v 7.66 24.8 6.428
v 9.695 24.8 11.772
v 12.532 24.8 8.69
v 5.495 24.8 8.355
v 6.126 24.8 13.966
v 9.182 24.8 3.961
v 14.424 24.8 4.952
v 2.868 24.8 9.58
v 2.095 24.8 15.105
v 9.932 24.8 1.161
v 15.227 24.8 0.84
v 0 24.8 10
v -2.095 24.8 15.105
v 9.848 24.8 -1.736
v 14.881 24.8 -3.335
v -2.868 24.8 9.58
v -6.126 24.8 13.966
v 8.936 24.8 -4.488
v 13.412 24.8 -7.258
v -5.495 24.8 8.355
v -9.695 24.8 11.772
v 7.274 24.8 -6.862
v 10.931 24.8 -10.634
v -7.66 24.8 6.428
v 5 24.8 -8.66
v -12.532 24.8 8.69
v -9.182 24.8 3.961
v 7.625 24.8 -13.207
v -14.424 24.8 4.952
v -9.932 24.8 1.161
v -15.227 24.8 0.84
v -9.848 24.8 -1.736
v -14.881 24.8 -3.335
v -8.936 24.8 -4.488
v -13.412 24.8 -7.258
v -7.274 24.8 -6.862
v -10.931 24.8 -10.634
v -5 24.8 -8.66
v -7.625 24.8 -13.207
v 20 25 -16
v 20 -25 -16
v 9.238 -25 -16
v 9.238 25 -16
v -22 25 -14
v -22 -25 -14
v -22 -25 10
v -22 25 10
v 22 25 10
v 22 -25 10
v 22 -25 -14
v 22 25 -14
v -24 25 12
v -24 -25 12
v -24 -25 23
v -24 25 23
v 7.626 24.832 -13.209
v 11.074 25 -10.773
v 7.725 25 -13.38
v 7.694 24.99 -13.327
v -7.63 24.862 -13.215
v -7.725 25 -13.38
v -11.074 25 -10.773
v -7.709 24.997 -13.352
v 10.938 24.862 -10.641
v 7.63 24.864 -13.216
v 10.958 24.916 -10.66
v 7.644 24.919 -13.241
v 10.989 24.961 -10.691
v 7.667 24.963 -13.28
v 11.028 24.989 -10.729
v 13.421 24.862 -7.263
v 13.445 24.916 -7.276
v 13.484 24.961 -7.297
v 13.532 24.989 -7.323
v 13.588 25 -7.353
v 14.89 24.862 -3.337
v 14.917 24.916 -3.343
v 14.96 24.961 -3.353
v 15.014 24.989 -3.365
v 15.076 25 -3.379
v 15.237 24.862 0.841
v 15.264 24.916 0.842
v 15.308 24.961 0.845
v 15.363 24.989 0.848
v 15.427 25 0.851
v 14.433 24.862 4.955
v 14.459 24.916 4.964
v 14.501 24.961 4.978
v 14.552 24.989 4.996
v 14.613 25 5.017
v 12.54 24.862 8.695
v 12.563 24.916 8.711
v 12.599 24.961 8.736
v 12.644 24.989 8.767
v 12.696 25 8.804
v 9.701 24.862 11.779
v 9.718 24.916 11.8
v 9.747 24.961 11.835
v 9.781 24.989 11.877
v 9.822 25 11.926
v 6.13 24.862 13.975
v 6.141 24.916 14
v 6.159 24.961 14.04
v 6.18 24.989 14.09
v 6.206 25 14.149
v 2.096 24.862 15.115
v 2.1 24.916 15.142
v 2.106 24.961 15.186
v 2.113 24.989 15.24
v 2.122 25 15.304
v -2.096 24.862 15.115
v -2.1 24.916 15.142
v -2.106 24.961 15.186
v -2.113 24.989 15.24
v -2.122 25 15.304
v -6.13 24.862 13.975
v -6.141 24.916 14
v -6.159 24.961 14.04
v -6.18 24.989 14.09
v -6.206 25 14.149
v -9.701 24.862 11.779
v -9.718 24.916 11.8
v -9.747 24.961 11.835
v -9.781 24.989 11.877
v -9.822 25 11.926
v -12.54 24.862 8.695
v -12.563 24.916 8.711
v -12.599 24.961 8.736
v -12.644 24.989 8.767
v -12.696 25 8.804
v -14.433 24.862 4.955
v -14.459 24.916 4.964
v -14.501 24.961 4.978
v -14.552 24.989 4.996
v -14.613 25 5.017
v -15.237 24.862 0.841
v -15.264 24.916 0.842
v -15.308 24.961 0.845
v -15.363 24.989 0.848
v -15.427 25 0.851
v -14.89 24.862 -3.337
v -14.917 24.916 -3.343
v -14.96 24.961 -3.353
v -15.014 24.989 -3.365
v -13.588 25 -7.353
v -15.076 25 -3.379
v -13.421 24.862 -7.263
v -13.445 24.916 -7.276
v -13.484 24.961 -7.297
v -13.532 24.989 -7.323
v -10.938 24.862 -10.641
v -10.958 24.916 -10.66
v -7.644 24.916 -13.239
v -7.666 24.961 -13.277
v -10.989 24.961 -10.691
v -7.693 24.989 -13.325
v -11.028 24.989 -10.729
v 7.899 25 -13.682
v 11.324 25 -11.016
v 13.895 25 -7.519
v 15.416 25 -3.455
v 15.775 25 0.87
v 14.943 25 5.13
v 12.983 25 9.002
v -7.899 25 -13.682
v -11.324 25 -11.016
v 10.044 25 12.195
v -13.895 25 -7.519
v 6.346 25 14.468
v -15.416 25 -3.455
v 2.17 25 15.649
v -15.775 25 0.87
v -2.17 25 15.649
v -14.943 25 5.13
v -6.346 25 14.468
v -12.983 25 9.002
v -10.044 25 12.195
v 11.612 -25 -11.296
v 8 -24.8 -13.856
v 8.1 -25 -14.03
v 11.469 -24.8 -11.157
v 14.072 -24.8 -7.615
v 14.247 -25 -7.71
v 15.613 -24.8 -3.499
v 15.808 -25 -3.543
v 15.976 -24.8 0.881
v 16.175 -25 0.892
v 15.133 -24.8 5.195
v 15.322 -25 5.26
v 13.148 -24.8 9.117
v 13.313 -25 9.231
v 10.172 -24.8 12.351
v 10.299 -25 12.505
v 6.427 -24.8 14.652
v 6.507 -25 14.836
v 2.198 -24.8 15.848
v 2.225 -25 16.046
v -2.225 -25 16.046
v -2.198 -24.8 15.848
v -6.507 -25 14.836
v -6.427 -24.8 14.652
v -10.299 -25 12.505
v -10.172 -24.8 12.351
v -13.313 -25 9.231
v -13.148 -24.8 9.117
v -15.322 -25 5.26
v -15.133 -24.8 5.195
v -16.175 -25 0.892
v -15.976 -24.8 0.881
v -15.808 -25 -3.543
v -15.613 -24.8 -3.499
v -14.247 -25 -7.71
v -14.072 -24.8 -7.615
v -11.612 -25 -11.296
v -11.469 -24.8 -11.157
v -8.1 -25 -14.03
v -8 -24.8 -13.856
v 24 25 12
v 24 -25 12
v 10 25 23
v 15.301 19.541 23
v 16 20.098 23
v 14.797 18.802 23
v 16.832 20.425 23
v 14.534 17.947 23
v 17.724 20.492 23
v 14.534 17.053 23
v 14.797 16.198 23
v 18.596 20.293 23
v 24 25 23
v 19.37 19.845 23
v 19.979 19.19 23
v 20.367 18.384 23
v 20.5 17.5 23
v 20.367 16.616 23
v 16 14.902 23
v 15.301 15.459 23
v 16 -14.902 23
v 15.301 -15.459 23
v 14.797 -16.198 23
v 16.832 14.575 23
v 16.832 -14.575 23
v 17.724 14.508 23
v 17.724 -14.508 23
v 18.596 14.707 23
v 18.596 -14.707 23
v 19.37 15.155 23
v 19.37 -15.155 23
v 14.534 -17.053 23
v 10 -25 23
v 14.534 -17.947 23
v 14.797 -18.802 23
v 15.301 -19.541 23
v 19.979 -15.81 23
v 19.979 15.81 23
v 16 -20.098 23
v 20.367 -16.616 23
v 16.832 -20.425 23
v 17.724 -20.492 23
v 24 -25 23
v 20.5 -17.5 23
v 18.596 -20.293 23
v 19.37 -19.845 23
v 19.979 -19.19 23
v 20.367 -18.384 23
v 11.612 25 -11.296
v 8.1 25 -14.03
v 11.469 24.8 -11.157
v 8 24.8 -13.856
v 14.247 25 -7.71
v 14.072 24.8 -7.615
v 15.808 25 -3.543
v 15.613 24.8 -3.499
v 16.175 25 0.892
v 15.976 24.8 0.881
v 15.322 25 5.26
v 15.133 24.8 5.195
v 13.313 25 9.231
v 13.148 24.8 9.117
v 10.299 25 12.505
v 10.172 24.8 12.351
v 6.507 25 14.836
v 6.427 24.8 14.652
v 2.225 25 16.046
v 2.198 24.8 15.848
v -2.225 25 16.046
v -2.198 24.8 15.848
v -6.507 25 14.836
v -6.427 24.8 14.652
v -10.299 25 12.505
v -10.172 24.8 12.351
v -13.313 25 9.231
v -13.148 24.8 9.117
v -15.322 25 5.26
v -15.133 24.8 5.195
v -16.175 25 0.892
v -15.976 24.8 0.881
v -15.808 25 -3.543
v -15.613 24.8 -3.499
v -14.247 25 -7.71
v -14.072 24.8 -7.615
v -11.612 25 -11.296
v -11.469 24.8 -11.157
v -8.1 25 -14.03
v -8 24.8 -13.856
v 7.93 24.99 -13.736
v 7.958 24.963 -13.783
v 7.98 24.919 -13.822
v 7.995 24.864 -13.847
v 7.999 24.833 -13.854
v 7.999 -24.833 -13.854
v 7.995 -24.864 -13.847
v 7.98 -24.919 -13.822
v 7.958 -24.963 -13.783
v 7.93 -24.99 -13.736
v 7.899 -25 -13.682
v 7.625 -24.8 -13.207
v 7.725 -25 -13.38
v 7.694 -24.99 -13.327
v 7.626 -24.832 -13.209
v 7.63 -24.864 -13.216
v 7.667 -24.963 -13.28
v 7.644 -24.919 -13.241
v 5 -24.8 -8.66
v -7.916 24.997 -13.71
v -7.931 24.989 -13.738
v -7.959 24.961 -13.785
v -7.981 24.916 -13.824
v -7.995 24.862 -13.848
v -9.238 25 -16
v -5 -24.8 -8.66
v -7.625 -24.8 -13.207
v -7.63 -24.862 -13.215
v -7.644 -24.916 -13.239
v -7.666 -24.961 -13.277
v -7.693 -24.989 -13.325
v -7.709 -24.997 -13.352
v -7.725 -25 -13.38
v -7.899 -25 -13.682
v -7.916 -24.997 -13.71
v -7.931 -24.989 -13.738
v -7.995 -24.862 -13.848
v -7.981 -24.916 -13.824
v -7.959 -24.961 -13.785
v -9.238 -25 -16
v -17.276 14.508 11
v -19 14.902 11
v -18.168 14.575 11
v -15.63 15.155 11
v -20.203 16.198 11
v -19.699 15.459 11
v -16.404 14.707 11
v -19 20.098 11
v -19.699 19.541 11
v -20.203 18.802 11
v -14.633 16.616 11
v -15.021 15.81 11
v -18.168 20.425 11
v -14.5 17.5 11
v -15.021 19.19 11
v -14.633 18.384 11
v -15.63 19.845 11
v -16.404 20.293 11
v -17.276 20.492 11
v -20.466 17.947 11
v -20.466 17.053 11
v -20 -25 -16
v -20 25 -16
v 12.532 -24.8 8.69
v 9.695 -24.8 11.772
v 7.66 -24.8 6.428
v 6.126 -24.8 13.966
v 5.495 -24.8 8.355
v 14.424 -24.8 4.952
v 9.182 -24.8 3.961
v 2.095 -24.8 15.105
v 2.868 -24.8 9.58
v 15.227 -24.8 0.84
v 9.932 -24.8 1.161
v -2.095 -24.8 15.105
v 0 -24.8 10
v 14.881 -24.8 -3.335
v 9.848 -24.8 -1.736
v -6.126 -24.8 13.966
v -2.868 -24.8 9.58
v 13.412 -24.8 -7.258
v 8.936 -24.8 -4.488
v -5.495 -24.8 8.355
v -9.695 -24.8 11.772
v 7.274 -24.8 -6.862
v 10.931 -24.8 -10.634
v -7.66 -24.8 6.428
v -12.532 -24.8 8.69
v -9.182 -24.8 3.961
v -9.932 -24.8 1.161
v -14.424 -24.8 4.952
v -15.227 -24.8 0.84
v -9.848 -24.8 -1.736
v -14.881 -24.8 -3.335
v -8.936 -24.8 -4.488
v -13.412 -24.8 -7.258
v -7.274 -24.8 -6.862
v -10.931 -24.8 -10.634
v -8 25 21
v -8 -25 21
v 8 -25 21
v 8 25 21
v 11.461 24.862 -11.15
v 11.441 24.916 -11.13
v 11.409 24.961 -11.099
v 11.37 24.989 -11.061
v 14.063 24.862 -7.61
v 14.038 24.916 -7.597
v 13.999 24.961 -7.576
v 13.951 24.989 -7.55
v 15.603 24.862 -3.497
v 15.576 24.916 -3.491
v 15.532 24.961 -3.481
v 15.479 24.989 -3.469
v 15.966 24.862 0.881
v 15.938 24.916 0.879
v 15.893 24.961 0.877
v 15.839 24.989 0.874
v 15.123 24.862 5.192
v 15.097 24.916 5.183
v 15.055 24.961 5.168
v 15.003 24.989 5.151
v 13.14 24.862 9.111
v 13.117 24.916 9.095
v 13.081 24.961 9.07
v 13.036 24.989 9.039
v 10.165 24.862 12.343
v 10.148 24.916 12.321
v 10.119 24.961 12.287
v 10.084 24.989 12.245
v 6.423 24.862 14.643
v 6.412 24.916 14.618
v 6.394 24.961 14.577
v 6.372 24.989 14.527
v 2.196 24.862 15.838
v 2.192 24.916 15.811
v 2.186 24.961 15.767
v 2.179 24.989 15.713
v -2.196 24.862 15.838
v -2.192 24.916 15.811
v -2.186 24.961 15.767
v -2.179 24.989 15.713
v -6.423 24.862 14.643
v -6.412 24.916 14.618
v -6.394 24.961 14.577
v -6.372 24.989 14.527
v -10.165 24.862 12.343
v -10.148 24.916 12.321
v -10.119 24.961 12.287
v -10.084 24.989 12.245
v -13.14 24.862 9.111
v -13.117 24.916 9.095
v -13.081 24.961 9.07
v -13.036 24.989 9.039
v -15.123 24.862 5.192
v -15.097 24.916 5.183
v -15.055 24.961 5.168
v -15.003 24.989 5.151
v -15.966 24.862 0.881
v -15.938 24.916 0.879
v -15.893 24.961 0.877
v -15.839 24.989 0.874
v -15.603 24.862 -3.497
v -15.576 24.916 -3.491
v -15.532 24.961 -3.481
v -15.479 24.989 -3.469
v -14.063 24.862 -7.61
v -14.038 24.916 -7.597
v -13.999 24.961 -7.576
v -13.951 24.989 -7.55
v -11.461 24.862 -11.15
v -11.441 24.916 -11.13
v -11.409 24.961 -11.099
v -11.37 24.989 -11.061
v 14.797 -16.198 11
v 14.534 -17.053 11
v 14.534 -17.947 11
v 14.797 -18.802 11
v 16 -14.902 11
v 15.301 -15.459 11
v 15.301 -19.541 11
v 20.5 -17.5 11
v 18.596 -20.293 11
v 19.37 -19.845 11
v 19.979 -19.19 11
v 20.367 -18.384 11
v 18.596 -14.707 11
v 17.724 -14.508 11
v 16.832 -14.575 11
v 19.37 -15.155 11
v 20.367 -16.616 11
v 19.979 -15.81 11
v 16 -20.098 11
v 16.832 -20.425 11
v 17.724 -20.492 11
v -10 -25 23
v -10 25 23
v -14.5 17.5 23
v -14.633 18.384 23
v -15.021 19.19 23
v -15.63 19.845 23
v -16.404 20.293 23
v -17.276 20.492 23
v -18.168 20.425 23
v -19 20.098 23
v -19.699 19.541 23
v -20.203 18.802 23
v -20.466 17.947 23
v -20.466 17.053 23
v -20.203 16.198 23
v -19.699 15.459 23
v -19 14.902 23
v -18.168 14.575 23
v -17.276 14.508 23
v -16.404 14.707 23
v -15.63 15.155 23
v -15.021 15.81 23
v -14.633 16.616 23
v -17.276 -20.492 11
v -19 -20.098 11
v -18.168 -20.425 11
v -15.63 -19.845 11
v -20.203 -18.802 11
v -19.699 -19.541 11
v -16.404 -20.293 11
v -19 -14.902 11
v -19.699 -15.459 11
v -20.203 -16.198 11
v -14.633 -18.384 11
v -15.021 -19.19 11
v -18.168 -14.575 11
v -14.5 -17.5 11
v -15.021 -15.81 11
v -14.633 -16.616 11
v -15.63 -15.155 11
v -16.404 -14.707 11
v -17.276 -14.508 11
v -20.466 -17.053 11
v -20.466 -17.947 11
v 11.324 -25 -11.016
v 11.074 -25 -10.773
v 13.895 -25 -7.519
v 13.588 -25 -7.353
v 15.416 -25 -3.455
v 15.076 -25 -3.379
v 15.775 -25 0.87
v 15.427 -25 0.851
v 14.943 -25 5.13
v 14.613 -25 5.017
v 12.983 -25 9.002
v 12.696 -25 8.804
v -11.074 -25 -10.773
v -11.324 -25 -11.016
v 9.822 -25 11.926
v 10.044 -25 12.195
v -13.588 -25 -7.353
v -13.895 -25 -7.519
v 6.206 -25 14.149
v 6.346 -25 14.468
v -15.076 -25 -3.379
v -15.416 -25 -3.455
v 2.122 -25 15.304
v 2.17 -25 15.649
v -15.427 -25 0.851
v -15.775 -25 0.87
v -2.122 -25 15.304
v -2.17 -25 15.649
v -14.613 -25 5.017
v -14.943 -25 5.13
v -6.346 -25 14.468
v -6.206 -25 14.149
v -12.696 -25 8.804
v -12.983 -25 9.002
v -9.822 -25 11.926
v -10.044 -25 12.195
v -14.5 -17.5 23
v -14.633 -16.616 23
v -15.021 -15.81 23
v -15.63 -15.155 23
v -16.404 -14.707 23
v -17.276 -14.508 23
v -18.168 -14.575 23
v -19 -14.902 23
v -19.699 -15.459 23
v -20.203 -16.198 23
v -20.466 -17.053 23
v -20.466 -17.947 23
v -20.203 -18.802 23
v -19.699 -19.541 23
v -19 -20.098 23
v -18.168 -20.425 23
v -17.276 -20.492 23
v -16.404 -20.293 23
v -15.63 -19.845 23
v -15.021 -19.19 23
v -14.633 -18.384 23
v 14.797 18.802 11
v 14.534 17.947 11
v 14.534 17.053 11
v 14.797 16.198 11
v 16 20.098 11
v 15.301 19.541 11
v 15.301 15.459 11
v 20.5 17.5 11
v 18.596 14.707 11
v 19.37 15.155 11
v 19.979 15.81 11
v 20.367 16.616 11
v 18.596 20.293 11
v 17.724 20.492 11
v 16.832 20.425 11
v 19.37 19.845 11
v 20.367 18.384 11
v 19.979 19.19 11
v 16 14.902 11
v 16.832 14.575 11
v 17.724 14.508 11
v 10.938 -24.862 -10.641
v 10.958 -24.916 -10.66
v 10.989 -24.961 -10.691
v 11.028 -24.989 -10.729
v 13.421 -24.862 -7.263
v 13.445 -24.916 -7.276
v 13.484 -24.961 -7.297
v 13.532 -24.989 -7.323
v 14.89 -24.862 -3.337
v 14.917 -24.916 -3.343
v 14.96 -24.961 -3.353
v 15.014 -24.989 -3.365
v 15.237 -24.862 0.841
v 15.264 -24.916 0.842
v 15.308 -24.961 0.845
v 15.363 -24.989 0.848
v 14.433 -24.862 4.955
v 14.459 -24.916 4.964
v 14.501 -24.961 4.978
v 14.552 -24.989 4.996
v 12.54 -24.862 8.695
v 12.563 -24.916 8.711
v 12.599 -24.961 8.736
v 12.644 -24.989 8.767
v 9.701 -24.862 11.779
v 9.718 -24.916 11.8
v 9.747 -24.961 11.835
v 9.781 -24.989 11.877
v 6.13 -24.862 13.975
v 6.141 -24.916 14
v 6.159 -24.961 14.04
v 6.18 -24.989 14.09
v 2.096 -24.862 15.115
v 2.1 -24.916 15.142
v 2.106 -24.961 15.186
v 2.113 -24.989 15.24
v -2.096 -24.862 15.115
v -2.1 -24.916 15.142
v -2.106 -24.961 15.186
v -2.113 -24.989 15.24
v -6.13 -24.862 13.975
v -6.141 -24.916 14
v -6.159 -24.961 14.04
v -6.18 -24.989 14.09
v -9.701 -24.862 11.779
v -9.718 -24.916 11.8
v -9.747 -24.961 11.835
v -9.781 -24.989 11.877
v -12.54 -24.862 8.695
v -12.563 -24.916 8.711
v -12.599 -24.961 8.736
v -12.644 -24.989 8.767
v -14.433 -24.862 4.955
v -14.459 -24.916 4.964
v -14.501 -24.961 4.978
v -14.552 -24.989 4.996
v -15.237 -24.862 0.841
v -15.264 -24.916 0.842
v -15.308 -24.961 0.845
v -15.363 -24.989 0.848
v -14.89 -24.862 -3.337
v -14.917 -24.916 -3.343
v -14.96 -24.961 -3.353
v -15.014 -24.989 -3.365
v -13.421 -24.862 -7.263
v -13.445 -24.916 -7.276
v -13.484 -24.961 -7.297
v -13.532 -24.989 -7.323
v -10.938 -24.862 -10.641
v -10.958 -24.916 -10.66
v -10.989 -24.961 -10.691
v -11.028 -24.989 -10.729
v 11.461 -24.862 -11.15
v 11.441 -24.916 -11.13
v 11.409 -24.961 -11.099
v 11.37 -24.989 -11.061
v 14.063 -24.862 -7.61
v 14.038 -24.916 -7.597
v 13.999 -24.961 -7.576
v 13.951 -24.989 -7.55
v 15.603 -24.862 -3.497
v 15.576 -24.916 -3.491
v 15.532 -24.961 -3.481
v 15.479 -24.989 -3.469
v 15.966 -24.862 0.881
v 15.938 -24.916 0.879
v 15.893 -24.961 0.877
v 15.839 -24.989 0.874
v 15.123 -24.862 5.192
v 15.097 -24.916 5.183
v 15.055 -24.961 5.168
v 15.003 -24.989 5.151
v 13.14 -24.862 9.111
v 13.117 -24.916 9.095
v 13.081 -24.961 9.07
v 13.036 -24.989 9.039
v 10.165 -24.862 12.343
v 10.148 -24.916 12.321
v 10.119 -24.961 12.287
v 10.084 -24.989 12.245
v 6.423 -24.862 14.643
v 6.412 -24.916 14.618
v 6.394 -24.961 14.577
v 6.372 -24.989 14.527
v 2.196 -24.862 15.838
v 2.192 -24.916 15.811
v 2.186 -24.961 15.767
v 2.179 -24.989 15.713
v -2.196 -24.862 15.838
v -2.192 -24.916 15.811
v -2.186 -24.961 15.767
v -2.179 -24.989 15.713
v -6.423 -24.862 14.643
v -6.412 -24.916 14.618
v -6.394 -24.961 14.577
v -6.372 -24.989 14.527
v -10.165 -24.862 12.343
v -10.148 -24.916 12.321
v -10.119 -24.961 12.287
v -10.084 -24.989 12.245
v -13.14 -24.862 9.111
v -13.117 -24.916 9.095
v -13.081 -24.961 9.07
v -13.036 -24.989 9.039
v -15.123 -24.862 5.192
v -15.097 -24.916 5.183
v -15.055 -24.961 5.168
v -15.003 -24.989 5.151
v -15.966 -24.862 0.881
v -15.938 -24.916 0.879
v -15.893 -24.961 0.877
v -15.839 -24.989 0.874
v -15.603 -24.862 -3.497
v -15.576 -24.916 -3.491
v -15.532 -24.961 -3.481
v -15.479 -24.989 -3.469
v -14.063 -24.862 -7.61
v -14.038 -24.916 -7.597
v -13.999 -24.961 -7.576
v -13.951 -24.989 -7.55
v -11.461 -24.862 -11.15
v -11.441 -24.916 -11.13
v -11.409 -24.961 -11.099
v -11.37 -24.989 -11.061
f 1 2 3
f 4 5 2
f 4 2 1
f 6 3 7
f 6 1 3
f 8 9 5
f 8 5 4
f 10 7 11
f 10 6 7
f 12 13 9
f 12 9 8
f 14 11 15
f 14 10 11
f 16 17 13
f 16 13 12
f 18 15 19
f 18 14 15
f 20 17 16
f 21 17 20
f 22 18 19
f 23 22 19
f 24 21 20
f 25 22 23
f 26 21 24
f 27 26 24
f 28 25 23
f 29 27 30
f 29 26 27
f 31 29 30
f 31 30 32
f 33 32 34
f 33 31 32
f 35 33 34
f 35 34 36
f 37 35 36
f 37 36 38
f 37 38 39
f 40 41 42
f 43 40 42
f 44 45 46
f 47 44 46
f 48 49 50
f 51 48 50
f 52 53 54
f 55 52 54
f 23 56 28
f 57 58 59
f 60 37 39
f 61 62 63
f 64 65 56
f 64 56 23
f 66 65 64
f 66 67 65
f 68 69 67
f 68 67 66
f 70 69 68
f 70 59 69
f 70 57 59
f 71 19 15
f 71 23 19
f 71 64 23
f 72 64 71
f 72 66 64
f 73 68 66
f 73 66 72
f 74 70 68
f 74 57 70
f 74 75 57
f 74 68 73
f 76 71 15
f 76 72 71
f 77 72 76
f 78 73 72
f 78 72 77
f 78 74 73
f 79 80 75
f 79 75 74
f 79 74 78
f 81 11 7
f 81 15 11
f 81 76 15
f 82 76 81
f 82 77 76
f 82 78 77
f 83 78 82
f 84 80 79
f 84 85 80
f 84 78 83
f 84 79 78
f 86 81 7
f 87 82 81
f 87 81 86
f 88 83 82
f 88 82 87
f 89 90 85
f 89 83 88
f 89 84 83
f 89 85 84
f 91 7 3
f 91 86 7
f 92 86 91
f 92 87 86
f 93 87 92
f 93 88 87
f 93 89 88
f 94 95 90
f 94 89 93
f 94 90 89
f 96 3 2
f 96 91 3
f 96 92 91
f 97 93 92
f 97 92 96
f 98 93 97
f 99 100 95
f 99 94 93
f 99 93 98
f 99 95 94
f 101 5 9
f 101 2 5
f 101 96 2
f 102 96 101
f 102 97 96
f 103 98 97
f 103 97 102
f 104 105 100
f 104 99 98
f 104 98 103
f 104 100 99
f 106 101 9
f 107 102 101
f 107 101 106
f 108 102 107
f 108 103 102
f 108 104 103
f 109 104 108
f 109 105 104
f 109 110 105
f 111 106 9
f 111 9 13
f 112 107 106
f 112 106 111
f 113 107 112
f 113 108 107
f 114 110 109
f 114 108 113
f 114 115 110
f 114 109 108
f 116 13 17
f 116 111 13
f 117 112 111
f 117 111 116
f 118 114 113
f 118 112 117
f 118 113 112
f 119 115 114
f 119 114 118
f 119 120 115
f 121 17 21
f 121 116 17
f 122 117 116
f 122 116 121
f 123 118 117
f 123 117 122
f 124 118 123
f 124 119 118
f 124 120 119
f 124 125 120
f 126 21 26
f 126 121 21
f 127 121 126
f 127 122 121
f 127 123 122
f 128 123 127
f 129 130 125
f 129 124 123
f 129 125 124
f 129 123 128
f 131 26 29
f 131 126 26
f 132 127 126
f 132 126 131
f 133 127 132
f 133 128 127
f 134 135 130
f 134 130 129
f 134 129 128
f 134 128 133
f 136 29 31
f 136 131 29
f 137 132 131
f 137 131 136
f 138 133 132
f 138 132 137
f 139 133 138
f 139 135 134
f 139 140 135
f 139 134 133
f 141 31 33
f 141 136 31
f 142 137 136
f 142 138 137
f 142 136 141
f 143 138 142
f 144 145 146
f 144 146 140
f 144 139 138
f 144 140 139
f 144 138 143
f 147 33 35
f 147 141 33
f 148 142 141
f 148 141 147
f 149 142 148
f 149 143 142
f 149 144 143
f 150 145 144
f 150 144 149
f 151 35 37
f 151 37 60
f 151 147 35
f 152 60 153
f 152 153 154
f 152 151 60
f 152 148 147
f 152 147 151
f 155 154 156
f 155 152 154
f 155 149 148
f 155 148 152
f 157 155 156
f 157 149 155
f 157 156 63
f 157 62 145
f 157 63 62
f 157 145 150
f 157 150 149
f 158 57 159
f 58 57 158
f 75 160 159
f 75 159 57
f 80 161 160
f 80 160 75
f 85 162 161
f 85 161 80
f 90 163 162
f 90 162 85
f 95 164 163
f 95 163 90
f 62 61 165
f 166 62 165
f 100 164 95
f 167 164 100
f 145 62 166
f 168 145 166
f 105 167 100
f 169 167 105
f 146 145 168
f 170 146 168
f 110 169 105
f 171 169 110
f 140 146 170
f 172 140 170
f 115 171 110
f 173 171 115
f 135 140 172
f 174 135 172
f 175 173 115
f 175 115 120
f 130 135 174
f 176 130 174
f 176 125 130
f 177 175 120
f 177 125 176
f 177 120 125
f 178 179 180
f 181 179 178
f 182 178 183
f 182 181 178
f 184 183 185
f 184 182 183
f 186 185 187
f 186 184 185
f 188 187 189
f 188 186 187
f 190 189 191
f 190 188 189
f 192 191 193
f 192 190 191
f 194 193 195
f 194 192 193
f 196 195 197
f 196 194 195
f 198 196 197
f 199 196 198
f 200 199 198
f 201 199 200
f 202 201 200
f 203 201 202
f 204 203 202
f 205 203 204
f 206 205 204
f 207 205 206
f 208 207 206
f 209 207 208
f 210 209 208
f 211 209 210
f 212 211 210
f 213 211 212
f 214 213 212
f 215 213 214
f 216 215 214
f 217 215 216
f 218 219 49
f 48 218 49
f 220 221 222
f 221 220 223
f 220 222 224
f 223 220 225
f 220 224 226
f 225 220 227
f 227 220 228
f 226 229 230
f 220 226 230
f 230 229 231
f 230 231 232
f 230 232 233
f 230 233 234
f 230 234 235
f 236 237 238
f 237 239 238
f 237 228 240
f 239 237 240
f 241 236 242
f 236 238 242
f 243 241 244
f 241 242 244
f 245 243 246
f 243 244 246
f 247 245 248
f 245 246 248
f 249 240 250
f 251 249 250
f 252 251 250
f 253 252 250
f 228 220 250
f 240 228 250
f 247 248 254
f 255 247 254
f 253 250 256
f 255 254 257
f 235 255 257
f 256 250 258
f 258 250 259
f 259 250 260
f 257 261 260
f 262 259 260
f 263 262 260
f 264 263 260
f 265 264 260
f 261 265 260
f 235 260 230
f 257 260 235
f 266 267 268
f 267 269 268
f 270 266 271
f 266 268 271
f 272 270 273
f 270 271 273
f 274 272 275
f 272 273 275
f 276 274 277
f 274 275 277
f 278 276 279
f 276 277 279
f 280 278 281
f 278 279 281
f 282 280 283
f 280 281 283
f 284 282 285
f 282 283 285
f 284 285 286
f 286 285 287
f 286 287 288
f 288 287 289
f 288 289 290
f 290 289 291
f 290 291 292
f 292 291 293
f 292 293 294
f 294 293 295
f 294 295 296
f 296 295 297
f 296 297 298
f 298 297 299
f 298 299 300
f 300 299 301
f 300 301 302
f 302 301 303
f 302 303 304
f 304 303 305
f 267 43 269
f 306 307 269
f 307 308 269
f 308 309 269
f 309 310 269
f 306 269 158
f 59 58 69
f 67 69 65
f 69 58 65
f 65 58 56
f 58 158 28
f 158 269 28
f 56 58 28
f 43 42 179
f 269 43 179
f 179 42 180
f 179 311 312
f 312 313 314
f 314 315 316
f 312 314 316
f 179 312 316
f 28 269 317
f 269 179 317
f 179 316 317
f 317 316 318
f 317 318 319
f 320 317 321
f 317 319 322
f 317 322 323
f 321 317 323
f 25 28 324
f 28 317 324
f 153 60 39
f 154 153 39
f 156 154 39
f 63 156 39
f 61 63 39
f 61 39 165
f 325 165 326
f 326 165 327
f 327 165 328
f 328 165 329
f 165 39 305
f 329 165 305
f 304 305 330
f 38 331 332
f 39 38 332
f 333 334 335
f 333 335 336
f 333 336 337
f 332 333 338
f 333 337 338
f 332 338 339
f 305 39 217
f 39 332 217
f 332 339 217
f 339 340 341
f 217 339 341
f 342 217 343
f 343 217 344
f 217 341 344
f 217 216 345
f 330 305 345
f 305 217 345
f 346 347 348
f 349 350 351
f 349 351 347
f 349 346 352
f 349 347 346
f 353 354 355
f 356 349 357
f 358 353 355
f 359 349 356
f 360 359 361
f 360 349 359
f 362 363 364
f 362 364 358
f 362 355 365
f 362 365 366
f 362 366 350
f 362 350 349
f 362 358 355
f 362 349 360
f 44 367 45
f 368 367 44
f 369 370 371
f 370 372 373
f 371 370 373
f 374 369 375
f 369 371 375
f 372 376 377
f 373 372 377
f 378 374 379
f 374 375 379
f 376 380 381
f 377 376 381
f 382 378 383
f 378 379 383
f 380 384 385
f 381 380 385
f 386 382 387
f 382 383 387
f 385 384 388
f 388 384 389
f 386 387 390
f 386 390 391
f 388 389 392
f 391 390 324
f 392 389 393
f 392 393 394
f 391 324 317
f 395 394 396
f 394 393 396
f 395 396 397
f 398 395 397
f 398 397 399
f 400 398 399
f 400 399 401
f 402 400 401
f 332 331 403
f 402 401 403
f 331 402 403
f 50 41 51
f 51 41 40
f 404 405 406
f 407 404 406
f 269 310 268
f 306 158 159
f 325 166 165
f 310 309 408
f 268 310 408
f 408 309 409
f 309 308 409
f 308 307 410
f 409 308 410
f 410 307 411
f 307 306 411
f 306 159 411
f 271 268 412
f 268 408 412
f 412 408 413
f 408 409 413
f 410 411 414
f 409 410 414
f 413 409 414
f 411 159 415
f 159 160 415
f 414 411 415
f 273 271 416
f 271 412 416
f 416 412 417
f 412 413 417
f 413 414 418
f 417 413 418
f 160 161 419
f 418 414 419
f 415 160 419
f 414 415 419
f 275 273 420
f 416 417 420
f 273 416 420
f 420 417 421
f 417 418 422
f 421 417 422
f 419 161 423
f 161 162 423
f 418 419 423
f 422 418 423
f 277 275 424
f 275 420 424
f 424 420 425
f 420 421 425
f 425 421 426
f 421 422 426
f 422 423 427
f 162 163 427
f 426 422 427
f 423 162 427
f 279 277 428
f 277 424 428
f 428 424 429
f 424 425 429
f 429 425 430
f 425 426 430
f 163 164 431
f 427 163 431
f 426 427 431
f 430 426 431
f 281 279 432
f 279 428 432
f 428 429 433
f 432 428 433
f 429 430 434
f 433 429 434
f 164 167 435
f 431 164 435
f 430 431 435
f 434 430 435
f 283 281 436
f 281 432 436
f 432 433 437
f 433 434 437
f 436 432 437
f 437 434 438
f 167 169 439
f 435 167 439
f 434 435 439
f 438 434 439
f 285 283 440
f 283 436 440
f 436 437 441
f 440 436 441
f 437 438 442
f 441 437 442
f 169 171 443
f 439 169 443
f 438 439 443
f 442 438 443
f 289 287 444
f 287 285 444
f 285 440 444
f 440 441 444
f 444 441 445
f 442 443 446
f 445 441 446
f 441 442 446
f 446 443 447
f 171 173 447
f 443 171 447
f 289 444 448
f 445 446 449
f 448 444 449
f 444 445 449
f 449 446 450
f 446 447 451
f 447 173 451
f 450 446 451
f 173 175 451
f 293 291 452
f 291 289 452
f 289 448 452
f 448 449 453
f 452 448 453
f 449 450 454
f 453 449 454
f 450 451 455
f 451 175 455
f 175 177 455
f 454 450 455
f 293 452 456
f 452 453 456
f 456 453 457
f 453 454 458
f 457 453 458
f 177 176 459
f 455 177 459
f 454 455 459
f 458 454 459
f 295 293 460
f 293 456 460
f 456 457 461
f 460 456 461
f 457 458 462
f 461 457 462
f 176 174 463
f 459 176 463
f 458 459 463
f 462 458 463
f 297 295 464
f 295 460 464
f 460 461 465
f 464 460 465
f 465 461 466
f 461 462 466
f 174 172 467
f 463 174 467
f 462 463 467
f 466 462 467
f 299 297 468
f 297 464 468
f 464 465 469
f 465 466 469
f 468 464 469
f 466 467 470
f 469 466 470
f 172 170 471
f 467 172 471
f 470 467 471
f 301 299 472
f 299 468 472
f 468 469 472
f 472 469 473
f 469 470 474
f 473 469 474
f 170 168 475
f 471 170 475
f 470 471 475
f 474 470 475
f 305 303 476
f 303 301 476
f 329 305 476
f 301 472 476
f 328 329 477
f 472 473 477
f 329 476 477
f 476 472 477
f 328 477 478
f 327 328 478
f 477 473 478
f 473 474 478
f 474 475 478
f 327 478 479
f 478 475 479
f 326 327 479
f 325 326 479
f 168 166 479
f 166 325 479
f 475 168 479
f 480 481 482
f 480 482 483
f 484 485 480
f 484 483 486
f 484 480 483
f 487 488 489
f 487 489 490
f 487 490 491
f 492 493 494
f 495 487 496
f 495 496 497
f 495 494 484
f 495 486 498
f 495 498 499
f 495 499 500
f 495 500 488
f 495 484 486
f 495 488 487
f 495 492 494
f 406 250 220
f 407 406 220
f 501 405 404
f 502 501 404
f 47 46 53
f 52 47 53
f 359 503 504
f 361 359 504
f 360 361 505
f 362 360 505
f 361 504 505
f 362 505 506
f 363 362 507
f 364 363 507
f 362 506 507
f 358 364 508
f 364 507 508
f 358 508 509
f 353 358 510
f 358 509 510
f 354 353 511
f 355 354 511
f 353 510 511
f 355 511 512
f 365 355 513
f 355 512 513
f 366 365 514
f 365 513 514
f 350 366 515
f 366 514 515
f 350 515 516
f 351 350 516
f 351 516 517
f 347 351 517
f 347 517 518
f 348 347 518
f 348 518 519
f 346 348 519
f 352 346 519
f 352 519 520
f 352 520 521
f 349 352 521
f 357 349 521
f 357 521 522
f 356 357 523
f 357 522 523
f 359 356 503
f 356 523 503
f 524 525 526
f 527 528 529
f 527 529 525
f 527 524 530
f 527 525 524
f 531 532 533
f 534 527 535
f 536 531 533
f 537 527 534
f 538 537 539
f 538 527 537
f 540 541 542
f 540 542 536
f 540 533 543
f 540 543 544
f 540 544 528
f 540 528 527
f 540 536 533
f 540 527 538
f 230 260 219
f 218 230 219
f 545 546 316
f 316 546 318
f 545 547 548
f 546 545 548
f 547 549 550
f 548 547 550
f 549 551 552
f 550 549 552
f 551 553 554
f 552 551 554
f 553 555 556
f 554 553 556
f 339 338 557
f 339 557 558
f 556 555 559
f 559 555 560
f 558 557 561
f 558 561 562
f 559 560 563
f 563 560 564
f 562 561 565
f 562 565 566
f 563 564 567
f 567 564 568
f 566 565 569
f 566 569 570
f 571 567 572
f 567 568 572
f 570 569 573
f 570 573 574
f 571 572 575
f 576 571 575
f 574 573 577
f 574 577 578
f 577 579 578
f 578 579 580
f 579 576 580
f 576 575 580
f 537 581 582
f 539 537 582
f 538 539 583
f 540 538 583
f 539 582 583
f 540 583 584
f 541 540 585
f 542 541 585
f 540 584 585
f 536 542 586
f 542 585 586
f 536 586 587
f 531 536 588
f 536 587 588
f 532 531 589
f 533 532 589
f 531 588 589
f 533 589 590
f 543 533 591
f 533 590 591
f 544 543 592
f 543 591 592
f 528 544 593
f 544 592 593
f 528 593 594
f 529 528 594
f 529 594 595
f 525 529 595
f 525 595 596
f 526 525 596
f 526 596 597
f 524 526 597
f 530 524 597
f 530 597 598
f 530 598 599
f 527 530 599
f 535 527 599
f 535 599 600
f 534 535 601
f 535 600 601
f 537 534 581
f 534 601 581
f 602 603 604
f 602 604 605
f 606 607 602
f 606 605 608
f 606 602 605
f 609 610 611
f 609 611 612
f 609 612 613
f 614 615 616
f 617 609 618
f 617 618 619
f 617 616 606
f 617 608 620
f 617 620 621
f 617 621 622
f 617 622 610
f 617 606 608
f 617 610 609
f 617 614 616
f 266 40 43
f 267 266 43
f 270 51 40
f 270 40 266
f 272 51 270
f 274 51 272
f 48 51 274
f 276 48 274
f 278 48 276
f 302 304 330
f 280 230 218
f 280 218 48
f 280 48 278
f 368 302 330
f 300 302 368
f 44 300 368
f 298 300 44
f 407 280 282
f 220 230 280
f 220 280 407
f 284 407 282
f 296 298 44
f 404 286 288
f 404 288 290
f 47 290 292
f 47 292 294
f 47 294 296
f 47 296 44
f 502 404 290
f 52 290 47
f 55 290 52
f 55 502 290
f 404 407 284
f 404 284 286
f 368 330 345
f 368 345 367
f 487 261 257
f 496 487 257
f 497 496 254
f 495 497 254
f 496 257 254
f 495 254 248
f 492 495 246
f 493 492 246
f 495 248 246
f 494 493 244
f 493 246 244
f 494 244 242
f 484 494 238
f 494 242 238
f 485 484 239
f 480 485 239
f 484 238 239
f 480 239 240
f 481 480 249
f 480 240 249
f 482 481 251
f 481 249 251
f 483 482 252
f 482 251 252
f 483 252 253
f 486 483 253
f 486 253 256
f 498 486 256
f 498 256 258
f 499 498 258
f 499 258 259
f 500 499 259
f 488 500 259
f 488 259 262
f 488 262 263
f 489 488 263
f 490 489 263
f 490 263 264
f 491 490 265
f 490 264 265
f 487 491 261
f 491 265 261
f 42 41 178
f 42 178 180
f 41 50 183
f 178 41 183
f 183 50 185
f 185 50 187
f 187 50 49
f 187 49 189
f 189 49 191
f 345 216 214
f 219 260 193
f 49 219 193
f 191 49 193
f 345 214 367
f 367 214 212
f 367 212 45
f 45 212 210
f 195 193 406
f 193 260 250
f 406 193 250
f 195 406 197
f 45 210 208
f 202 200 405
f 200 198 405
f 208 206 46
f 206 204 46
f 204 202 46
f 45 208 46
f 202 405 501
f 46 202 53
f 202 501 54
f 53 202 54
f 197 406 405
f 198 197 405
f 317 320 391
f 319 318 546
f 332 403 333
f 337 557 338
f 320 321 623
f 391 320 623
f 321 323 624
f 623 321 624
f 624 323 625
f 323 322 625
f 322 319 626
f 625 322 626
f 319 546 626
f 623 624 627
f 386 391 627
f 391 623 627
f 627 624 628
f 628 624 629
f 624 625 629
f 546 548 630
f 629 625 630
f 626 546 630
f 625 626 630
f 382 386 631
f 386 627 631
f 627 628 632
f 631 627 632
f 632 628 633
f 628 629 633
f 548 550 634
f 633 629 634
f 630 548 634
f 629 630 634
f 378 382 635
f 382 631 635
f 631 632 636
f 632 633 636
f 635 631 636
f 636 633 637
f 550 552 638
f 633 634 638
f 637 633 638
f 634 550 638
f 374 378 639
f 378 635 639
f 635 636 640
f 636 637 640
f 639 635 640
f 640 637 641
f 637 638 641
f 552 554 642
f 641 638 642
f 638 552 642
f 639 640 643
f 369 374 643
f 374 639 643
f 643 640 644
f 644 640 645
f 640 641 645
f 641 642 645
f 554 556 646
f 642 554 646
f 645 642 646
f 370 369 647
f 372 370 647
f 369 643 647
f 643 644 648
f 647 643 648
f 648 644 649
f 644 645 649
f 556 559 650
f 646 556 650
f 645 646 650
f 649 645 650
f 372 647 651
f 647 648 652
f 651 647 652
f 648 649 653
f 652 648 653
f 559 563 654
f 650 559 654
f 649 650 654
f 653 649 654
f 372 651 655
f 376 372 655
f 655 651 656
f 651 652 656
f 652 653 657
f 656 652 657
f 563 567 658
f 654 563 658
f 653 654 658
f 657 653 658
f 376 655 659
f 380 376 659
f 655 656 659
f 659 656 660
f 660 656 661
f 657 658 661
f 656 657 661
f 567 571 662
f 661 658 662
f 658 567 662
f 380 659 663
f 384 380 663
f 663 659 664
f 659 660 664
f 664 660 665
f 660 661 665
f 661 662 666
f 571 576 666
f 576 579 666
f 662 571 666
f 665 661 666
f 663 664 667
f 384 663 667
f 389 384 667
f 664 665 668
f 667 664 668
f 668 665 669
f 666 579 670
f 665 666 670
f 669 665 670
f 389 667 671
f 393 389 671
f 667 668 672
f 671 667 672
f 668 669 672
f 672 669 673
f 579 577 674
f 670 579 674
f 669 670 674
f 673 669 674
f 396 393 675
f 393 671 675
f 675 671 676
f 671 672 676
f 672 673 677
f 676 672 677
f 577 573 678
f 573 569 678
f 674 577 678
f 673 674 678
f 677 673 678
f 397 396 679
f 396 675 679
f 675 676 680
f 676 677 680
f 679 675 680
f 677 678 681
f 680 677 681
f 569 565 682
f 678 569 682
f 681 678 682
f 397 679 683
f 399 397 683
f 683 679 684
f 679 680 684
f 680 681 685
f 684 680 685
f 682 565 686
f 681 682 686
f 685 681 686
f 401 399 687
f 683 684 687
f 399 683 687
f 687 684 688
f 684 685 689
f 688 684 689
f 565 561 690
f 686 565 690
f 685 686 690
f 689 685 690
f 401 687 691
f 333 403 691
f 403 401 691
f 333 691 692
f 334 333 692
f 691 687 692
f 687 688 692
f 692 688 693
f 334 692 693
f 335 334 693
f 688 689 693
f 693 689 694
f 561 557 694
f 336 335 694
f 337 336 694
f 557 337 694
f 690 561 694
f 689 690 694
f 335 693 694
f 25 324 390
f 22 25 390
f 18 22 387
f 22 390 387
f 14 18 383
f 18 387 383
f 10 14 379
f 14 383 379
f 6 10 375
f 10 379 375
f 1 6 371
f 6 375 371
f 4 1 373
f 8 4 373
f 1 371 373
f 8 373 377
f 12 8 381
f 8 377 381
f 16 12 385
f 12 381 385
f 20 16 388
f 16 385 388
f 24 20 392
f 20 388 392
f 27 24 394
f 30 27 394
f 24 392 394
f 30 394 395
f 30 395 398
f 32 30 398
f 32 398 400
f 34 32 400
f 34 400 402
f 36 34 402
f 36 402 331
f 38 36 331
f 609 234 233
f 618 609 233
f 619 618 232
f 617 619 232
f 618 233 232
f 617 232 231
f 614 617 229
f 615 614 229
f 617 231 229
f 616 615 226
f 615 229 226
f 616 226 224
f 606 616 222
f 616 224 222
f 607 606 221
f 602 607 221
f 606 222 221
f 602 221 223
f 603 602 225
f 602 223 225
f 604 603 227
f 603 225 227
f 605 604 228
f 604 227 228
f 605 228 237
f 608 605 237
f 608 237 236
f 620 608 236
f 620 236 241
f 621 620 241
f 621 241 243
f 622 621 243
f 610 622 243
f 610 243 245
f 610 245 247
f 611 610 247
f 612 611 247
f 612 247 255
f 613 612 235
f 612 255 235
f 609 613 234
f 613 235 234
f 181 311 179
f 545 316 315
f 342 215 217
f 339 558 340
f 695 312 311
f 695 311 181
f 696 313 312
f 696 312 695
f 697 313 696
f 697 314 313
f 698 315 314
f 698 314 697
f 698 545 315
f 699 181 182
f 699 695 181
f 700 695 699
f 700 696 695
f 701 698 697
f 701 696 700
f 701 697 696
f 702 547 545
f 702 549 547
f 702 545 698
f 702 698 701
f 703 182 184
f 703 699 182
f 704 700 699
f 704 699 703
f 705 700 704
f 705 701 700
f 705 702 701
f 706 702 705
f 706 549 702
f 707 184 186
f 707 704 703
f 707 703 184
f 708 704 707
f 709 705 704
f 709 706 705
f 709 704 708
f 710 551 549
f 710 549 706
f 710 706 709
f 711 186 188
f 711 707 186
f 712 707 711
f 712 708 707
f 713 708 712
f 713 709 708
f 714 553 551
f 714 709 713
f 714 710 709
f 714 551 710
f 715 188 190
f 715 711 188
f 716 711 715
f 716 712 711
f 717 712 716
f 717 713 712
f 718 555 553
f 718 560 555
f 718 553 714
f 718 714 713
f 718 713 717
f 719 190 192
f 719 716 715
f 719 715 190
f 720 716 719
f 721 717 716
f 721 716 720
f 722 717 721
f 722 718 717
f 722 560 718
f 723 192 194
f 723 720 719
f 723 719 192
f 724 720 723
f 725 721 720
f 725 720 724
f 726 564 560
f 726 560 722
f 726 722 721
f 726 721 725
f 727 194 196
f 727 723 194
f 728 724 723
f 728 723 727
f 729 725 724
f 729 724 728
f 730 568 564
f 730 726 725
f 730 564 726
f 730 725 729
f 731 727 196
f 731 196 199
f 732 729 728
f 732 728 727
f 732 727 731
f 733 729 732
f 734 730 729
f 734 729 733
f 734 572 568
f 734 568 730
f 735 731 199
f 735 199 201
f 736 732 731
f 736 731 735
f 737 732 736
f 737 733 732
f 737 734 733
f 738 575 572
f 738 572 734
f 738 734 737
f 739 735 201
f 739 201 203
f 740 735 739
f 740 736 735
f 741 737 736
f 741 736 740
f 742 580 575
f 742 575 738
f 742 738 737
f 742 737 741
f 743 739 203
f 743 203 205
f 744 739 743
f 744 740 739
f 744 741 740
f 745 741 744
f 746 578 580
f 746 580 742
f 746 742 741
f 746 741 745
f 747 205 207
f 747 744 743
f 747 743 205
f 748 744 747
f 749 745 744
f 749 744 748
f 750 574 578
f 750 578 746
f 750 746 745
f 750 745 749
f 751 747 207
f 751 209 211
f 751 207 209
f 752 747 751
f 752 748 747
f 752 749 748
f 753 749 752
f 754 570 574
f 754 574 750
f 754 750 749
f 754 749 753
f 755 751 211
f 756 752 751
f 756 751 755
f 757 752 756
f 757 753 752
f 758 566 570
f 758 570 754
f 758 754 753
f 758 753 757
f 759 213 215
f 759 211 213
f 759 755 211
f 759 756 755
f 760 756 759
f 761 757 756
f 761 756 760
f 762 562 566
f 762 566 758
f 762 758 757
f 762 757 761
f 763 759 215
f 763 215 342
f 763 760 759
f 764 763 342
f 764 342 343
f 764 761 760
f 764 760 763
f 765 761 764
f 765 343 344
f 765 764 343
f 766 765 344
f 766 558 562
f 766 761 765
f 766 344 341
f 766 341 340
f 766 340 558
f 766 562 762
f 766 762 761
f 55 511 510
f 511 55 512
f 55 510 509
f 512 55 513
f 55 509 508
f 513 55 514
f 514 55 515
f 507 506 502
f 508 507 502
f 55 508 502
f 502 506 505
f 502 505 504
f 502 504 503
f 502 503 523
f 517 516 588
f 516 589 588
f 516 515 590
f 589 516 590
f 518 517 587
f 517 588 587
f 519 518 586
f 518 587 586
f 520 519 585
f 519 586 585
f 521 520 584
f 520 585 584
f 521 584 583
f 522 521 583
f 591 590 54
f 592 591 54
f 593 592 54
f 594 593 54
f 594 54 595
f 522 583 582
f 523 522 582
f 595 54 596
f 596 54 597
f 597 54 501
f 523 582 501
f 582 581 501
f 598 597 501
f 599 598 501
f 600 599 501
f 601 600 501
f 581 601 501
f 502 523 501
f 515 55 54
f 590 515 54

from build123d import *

# Parameters (mm, degrees)
EXTRUDE_2_DEPTH     = 50
CHAMFER_1_SIZE      = 2
SKETCH_5_R          = 3
CUT_EXTRUDE_1_DEPTH = 12
CHAMFER_2_SIZE      = 2


with BuildPart() as part:
    # 草图4 → 拉伸2 (new body)
    with BuildSketch(Plane(origin=(0, -25, 0), x_dir=(-1, 0, 0), z_dir=(0, 1, 0))):
        with BuildLine():
            Line((8, 21), (-8, 21))
            Line((-8, 21), (-8, 23))
            Line((-8, 23), (-24, 23))
            Line((-24, 23), (-24, 12))
            Line((-24, 12), (-22, 10))
            Line((-22, 10), (-22, -16))
            Line((-22, -16), (-9.237604307, -16))
            Line((-9.237604307, -16), (-5, -8.660254038))
            ThreePointArc((-5, -8.660254038), (0, 10), (5, -8.660254038))
            Line((5, -8.660254038), (9.237604307, -16))
            Line((9.237604307, -16), (22, -16))
            Line((22, -16), (22, 10))
            Line((22, 10), (24, 12))
            Line((24, 12), (24, 23))
            Line((24, 23), (8, 23))
            Line((8, 23), (8, 21))
        make_face()
    extrude(amount=EXTRUDE_2_DEPTH)

    # 倒角1
    chamfer_1_edges = [part.edges().sort_by_distance(p)[0] for p in [
        (-8, 0, 23),
        (8, 0, 23),
    ]]
    chamfer(chamfer_1_edges, length=CHAMFER_1_SIZE - 0.0001)  # a hair under: the kernel refuses the full size

    # 草图5 → 切除-拉伸1 (cut)
    with BuildSketch(Plane.XY.offset(23)):
        with Locations((-17.5, 17.5)):
            Circle(SKETCH_5_R)
        with Locations((17.5, 17.5)):
            Circle(SKETCH_5_R)
        with Locations((17.5, -17.5)):
            Circle(SKETCH_5_R)
        with Locations((-17.5, -17.5)):
            Circle(SKETCH_5_R)
    extrude(amount=-CUT_EXTRUDE_1_DEPTH, mode=Mode.SUBTRACT)

    # 倒角2
    chamfer_2_edges = [part.edges().sort_by_distance(p)[0] for p in [
        (-22, 0, -16),
        (22, 0, -16),
    ]]
    chamfer(chamfer_2_edges, length=CHAMFER_2_SIZE)

    # 草图6 → 切除-旋转1 (revolve, cut)
    with BuildSketch(Plane(origin=(0, 0, 0), x_dir=(0, 0, -1), z_dir=(1, 0, 0))):
        with BuildLine():
            Line((-16.2, -25), (-16, -24.8))
            ThreePointArc((-16, -24.8), (-15.940621125, -24.941496067), (-15.798761062, -25))
            Line((-15.798761062, -25), (-16.2, -25))
        make_face()
        with BuildLine():
            Line((-15.45, -25), (0, -25))
            Line((0, -25), (0, -24.8))
            Line((0, -24.8), (-15.25, -24.8))
            ThreePointArc((-15.25, -24.8), (-15.308578644, -24.941421356), (-15.45, -25))
        make_face()
    cut_revolve_1 = revolve(axis=Axis((0, -10.264906919, 0), (0, -1, 0)), mode=Mode.SUBTRACT)

    # 镜向1: 切除-旋转1 across plane
    add(cut_revolve_1.mirror(Plane.ZX), mode=Mode.SUBTRACT)


solid = part.part
